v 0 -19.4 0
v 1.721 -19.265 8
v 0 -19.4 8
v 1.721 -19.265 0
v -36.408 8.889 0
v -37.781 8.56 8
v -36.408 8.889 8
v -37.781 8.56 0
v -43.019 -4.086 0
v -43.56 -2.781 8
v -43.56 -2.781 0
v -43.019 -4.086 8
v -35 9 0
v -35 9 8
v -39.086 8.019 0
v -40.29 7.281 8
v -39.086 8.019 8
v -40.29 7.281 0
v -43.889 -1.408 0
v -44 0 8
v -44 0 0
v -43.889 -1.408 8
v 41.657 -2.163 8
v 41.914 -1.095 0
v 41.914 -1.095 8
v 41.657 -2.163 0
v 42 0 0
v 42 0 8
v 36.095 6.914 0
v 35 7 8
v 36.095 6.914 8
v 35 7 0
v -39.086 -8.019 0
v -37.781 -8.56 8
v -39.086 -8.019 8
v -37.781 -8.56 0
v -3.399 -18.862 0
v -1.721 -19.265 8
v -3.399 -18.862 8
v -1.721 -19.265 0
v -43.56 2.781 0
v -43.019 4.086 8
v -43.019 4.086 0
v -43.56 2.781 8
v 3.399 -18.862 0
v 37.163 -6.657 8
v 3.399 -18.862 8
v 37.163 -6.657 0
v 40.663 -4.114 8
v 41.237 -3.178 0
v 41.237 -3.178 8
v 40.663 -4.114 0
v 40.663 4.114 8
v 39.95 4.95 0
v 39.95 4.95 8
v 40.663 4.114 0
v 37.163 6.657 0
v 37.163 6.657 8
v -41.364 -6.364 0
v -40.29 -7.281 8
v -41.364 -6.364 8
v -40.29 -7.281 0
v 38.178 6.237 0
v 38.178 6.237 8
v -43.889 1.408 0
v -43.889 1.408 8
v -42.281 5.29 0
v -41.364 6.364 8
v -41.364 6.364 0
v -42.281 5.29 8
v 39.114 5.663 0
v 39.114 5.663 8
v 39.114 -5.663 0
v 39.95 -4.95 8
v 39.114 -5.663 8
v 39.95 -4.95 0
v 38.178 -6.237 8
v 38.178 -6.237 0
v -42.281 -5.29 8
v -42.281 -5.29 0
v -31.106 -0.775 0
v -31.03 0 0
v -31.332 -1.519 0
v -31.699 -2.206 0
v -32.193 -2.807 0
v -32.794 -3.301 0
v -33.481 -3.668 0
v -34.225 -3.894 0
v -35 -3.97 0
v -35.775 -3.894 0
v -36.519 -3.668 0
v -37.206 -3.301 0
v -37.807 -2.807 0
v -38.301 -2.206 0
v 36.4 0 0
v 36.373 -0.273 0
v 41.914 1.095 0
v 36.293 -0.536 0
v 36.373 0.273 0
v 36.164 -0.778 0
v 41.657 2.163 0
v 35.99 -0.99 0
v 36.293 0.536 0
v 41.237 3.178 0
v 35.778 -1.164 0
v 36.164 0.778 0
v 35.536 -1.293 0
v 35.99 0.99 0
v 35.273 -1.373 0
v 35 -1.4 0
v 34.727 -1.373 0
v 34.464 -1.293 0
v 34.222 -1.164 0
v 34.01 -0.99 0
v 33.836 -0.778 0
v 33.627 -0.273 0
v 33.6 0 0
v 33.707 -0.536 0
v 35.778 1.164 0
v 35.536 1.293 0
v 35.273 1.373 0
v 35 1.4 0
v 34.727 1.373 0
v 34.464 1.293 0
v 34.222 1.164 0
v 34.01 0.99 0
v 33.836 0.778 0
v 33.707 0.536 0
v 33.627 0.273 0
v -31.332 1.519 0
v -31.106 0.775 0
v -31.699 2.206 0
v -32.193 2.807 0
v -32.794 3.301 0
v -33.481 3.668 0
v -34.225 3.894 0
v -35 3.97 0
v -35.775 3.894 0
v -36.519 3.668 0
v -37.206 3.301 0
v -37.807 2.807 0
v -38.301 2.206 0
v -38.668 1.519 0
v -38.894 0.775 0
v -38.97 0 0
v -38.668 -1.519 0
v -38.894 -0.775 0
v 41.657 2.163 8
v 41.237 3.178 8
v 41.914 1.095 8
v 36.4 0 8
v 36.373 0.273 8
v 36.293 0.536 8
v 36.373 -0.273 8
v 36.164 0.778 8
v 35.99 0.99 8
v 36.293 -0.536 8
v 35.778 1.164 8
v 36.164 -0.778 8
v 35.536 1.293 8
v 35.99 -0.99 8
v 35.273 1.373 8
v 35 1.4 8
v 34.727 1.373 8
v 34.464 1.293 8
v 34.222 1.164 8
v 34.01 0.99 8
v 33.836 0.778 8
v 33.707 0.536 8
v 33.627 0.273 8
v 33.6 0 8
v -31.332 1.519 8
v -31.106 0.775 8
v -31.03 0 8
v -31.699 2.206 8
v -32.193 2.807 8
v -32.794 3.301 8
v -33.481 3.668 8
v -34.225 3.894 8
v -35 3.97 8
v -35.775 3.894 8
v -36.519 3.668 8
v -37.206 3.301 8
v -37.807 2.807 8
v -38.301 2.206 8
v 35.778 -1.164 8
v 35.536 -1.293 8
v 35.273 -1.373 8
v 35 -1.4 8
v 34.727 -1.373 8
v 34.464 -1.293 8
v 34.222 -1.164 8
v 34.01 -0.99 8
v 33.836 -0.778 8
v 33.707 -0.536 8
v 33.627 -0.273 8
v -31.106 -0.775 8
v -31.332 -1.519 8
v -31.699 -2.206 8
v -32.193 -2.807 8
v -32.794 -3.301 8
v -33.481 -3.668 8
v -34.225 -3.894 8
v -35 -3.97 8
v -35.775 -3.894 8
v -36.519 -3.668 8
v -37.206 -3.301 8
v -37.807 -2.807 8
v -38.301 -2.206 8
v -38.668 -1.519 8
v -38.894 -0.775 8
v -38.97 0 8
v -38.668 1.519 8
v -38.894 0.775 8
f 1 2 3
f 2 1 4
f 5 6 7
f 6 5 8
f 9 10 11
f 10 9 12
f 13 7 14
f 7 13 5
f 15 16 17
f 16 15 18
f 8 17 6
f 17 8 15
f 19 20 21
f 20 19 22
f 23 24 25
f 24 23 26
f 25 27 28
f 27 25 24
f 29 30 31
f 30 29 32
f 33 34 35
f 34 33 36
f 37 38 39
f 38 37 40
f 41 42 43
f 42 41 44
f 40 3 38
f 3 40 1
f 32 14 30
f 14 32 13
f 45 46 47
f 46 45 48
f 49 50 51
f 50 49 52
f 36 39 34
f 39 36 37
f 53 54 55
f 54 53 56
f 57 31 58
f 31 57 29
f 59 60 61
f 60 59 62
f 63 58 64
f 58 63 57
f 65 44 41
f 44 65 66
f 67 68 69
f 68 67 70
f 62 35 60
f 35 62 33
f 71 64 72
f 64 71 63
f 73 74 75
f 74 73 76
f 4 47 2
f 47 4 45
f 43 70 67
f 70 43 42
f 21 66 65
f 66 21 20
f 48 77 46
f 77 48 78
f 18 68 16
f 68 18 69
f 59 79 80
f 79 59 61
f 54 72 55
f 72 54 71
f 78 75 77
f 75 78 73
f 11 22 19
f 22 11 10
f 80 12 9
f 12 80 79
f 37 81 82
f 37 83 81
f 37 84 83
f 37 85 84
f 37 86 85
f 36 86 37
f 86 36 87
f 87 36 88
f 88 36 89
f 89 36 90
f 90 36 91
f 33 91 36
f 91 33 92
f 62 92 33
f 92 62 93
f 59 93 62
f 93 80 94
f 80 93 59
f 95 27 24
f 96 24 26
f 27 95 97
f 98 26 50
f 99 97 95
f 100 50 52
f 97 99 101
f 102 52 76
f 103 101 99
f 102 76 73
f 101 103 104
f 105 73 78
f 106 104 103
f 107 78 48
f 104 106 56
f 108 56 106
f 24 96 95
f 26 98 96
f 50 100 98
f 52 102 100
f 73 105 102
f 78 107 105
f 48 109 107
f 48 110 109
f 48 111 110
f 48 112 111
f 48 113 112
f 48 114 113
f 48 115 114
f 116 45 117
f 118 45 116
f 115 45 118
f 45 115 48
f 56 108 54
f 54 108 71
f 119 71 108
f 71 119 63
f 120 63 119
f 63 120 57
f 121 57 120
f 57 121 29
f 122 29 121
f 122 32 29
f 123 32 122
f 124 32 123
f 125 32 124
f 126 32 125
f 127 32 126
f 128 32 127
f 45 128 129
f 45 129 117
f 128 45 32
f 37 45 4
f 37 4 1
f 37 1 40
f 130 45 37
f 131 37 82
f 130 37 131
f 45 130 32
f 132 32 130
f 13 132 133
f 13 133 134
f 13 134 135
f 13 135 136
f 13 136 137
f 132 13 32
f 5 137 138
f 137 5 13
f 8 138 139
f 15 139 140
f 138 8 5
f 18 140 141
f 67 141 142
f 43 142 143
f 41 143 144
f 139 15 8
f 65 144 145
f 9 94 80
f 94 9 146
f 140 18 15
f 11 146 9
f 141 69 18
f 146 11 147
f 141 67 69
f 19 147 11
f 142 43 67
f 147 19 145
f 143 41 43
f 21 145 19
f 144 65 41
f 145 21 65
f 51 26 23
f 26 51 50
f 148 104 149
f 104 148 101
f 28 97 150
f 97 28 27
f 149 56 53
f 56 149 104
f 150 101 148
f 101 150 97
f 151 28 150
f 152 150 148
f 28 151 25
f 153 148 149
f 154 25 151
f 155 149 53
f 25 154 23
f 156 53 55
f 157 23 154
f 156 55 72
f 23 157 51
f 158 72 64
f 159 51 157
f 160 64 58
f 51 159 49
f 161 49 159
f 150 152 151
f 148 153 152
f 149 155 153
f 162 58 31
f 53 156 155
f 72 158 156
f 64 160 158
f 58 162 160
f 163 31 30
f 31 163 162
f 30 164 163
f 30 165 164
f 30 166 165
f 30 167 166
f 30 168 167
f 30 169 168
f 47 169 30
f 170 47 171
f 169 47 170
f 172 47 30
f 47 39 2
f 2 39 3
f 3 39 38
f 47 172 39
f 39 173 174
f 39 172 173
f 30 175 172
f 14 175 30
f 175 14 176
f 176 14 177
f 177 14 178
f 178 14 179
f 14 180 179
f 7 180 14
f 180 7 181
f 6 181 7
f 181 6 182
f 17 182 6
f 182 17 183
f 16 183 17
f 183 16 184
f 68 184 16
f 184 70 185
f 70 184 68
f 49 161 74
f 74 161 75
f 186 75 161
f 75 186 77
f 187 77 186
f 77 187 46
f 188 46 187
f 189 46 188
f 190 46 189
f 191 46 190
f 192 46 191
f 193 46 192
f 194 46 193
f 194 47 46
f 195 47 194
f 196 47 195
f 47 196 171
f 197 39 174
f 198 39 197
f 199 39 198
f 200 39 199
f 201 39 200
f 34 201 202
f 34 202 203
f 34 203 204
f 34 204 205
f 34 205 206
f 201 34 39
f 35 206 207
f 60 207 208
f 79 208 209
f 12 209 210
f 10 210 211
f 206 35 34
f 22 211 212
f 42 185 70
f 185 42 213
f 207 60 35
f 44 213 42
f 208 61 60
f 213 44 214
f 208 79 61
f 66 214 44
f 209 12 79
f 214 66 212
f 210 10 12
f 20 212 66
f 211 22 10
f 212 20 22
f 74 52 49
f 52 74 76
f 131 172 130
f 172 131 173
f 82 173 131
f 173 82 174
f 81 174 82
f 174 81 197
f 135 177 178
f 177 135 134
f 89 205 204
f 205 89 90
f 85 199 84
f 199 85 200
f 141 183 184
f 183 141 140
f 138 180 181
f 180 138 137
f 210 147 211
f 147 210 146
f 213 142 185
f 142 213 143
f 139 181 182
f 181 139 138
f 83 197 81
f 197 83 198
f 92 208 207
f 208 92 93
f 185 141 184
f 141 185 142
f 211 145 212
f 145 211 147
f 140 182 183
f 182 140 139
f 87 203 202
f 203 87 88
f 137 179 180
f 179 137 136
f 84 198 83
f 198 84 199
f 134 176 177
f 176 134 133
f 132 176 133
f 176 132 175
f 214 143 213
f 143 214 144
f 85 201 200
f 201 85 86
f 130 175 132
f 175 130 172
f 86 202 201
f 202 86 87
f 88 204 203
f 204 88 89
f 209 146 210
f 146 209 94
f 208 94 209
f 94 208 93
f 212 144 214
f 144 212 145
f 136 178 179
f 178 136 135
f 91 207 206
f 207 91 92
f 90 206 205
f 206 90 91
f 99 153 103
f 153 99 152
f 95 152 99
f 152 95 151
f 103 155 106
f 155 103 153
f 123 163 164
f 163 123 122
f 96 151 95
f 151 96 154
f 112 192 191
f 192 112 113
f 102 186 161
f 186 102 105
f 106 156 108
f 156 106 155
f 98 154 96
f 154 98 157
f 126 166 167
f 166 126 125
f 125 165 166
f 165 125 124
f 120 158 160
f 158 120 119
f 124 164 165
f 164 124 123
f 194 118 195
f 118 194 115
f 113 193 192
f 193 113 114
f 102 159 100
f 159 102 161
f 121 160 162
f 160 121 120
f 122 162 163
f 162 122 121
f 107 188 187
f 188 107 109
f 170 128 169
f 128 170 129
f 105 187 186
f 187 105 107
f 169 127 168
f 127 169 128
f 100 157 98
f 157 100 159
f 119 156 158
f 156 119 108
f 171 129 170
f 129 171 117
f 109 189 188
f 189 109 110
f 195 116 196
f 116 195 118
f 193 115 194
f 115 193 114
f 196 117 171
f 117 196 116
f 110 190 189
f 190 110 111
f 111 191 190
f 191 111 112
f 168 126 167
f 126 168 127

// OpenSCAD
$fn = 32;

// ----------------------------------------------------------------------
// Lever: 70 mm between the bosses, 8 mm thick, smooth outline
// ----------------------------------------------------------------------

// --- parameters (mm) ---
lever_l = 70;             // distance between the boss centres
boss_a = 18;              // first boss diameter
boss_b = 14;              // second boss diameter
bore_a = 7.94;            // first bore
bore_b = 2.8;             // second bore
lever_t = 8;              // lever thickness
boss_c = 22;              // middle boss diameter
bend = 8.4;               // how far the middle boss drops

lever_profile = [[-44, 0], [-43.889, -1.408], [-43.56, -2.781], [-43.019, -4.086], [-42.281, -5.29], [-41.364, -6.364], [-40.29, -7.281], [-39.086, -8.019], [-37.781, -8.56], [-3.399, -18.862], [-1.721, -19.265], [0, -19.4], [1.721, -19.265], [3.399, -18.862], [37.163, -6.657], [38.178, -6.237], [39.114, -5.663], [39.95, -4.95], [40.663, -4.114], [41.237, -3.178], [41.657, -2.163], [41.914, -1.095], [42, 0], [41.914, 1.095], [41.657, 2.163], [41.237, 3.178], [40.663, 4.114], [39.95, 4.95], [39.114, 5.663], [38.178, 6.237], [37.163, 6.657], [36.095, 6.914], [35, 7], [-35, 9], [-36.408, 8.889], [-37.781, 8.56], [-39.086, 8.019], [-40.29, 7.281], [-41.364, 6.364], [-42.281, 5.29], [-43.019, 4.086], [-43.56, 2.781], [-43.889, 1.408]];

difference() {
  linear_extrude(height = lever_t) polygon(lever_profile);
  translate([-35, 0, -2.5]) cylinder(h = lever_t + 5, d = bore_a);
  translate([35, 0, -2.5]) cylinder(h = lever_t + 5, d = bore_b);
}
